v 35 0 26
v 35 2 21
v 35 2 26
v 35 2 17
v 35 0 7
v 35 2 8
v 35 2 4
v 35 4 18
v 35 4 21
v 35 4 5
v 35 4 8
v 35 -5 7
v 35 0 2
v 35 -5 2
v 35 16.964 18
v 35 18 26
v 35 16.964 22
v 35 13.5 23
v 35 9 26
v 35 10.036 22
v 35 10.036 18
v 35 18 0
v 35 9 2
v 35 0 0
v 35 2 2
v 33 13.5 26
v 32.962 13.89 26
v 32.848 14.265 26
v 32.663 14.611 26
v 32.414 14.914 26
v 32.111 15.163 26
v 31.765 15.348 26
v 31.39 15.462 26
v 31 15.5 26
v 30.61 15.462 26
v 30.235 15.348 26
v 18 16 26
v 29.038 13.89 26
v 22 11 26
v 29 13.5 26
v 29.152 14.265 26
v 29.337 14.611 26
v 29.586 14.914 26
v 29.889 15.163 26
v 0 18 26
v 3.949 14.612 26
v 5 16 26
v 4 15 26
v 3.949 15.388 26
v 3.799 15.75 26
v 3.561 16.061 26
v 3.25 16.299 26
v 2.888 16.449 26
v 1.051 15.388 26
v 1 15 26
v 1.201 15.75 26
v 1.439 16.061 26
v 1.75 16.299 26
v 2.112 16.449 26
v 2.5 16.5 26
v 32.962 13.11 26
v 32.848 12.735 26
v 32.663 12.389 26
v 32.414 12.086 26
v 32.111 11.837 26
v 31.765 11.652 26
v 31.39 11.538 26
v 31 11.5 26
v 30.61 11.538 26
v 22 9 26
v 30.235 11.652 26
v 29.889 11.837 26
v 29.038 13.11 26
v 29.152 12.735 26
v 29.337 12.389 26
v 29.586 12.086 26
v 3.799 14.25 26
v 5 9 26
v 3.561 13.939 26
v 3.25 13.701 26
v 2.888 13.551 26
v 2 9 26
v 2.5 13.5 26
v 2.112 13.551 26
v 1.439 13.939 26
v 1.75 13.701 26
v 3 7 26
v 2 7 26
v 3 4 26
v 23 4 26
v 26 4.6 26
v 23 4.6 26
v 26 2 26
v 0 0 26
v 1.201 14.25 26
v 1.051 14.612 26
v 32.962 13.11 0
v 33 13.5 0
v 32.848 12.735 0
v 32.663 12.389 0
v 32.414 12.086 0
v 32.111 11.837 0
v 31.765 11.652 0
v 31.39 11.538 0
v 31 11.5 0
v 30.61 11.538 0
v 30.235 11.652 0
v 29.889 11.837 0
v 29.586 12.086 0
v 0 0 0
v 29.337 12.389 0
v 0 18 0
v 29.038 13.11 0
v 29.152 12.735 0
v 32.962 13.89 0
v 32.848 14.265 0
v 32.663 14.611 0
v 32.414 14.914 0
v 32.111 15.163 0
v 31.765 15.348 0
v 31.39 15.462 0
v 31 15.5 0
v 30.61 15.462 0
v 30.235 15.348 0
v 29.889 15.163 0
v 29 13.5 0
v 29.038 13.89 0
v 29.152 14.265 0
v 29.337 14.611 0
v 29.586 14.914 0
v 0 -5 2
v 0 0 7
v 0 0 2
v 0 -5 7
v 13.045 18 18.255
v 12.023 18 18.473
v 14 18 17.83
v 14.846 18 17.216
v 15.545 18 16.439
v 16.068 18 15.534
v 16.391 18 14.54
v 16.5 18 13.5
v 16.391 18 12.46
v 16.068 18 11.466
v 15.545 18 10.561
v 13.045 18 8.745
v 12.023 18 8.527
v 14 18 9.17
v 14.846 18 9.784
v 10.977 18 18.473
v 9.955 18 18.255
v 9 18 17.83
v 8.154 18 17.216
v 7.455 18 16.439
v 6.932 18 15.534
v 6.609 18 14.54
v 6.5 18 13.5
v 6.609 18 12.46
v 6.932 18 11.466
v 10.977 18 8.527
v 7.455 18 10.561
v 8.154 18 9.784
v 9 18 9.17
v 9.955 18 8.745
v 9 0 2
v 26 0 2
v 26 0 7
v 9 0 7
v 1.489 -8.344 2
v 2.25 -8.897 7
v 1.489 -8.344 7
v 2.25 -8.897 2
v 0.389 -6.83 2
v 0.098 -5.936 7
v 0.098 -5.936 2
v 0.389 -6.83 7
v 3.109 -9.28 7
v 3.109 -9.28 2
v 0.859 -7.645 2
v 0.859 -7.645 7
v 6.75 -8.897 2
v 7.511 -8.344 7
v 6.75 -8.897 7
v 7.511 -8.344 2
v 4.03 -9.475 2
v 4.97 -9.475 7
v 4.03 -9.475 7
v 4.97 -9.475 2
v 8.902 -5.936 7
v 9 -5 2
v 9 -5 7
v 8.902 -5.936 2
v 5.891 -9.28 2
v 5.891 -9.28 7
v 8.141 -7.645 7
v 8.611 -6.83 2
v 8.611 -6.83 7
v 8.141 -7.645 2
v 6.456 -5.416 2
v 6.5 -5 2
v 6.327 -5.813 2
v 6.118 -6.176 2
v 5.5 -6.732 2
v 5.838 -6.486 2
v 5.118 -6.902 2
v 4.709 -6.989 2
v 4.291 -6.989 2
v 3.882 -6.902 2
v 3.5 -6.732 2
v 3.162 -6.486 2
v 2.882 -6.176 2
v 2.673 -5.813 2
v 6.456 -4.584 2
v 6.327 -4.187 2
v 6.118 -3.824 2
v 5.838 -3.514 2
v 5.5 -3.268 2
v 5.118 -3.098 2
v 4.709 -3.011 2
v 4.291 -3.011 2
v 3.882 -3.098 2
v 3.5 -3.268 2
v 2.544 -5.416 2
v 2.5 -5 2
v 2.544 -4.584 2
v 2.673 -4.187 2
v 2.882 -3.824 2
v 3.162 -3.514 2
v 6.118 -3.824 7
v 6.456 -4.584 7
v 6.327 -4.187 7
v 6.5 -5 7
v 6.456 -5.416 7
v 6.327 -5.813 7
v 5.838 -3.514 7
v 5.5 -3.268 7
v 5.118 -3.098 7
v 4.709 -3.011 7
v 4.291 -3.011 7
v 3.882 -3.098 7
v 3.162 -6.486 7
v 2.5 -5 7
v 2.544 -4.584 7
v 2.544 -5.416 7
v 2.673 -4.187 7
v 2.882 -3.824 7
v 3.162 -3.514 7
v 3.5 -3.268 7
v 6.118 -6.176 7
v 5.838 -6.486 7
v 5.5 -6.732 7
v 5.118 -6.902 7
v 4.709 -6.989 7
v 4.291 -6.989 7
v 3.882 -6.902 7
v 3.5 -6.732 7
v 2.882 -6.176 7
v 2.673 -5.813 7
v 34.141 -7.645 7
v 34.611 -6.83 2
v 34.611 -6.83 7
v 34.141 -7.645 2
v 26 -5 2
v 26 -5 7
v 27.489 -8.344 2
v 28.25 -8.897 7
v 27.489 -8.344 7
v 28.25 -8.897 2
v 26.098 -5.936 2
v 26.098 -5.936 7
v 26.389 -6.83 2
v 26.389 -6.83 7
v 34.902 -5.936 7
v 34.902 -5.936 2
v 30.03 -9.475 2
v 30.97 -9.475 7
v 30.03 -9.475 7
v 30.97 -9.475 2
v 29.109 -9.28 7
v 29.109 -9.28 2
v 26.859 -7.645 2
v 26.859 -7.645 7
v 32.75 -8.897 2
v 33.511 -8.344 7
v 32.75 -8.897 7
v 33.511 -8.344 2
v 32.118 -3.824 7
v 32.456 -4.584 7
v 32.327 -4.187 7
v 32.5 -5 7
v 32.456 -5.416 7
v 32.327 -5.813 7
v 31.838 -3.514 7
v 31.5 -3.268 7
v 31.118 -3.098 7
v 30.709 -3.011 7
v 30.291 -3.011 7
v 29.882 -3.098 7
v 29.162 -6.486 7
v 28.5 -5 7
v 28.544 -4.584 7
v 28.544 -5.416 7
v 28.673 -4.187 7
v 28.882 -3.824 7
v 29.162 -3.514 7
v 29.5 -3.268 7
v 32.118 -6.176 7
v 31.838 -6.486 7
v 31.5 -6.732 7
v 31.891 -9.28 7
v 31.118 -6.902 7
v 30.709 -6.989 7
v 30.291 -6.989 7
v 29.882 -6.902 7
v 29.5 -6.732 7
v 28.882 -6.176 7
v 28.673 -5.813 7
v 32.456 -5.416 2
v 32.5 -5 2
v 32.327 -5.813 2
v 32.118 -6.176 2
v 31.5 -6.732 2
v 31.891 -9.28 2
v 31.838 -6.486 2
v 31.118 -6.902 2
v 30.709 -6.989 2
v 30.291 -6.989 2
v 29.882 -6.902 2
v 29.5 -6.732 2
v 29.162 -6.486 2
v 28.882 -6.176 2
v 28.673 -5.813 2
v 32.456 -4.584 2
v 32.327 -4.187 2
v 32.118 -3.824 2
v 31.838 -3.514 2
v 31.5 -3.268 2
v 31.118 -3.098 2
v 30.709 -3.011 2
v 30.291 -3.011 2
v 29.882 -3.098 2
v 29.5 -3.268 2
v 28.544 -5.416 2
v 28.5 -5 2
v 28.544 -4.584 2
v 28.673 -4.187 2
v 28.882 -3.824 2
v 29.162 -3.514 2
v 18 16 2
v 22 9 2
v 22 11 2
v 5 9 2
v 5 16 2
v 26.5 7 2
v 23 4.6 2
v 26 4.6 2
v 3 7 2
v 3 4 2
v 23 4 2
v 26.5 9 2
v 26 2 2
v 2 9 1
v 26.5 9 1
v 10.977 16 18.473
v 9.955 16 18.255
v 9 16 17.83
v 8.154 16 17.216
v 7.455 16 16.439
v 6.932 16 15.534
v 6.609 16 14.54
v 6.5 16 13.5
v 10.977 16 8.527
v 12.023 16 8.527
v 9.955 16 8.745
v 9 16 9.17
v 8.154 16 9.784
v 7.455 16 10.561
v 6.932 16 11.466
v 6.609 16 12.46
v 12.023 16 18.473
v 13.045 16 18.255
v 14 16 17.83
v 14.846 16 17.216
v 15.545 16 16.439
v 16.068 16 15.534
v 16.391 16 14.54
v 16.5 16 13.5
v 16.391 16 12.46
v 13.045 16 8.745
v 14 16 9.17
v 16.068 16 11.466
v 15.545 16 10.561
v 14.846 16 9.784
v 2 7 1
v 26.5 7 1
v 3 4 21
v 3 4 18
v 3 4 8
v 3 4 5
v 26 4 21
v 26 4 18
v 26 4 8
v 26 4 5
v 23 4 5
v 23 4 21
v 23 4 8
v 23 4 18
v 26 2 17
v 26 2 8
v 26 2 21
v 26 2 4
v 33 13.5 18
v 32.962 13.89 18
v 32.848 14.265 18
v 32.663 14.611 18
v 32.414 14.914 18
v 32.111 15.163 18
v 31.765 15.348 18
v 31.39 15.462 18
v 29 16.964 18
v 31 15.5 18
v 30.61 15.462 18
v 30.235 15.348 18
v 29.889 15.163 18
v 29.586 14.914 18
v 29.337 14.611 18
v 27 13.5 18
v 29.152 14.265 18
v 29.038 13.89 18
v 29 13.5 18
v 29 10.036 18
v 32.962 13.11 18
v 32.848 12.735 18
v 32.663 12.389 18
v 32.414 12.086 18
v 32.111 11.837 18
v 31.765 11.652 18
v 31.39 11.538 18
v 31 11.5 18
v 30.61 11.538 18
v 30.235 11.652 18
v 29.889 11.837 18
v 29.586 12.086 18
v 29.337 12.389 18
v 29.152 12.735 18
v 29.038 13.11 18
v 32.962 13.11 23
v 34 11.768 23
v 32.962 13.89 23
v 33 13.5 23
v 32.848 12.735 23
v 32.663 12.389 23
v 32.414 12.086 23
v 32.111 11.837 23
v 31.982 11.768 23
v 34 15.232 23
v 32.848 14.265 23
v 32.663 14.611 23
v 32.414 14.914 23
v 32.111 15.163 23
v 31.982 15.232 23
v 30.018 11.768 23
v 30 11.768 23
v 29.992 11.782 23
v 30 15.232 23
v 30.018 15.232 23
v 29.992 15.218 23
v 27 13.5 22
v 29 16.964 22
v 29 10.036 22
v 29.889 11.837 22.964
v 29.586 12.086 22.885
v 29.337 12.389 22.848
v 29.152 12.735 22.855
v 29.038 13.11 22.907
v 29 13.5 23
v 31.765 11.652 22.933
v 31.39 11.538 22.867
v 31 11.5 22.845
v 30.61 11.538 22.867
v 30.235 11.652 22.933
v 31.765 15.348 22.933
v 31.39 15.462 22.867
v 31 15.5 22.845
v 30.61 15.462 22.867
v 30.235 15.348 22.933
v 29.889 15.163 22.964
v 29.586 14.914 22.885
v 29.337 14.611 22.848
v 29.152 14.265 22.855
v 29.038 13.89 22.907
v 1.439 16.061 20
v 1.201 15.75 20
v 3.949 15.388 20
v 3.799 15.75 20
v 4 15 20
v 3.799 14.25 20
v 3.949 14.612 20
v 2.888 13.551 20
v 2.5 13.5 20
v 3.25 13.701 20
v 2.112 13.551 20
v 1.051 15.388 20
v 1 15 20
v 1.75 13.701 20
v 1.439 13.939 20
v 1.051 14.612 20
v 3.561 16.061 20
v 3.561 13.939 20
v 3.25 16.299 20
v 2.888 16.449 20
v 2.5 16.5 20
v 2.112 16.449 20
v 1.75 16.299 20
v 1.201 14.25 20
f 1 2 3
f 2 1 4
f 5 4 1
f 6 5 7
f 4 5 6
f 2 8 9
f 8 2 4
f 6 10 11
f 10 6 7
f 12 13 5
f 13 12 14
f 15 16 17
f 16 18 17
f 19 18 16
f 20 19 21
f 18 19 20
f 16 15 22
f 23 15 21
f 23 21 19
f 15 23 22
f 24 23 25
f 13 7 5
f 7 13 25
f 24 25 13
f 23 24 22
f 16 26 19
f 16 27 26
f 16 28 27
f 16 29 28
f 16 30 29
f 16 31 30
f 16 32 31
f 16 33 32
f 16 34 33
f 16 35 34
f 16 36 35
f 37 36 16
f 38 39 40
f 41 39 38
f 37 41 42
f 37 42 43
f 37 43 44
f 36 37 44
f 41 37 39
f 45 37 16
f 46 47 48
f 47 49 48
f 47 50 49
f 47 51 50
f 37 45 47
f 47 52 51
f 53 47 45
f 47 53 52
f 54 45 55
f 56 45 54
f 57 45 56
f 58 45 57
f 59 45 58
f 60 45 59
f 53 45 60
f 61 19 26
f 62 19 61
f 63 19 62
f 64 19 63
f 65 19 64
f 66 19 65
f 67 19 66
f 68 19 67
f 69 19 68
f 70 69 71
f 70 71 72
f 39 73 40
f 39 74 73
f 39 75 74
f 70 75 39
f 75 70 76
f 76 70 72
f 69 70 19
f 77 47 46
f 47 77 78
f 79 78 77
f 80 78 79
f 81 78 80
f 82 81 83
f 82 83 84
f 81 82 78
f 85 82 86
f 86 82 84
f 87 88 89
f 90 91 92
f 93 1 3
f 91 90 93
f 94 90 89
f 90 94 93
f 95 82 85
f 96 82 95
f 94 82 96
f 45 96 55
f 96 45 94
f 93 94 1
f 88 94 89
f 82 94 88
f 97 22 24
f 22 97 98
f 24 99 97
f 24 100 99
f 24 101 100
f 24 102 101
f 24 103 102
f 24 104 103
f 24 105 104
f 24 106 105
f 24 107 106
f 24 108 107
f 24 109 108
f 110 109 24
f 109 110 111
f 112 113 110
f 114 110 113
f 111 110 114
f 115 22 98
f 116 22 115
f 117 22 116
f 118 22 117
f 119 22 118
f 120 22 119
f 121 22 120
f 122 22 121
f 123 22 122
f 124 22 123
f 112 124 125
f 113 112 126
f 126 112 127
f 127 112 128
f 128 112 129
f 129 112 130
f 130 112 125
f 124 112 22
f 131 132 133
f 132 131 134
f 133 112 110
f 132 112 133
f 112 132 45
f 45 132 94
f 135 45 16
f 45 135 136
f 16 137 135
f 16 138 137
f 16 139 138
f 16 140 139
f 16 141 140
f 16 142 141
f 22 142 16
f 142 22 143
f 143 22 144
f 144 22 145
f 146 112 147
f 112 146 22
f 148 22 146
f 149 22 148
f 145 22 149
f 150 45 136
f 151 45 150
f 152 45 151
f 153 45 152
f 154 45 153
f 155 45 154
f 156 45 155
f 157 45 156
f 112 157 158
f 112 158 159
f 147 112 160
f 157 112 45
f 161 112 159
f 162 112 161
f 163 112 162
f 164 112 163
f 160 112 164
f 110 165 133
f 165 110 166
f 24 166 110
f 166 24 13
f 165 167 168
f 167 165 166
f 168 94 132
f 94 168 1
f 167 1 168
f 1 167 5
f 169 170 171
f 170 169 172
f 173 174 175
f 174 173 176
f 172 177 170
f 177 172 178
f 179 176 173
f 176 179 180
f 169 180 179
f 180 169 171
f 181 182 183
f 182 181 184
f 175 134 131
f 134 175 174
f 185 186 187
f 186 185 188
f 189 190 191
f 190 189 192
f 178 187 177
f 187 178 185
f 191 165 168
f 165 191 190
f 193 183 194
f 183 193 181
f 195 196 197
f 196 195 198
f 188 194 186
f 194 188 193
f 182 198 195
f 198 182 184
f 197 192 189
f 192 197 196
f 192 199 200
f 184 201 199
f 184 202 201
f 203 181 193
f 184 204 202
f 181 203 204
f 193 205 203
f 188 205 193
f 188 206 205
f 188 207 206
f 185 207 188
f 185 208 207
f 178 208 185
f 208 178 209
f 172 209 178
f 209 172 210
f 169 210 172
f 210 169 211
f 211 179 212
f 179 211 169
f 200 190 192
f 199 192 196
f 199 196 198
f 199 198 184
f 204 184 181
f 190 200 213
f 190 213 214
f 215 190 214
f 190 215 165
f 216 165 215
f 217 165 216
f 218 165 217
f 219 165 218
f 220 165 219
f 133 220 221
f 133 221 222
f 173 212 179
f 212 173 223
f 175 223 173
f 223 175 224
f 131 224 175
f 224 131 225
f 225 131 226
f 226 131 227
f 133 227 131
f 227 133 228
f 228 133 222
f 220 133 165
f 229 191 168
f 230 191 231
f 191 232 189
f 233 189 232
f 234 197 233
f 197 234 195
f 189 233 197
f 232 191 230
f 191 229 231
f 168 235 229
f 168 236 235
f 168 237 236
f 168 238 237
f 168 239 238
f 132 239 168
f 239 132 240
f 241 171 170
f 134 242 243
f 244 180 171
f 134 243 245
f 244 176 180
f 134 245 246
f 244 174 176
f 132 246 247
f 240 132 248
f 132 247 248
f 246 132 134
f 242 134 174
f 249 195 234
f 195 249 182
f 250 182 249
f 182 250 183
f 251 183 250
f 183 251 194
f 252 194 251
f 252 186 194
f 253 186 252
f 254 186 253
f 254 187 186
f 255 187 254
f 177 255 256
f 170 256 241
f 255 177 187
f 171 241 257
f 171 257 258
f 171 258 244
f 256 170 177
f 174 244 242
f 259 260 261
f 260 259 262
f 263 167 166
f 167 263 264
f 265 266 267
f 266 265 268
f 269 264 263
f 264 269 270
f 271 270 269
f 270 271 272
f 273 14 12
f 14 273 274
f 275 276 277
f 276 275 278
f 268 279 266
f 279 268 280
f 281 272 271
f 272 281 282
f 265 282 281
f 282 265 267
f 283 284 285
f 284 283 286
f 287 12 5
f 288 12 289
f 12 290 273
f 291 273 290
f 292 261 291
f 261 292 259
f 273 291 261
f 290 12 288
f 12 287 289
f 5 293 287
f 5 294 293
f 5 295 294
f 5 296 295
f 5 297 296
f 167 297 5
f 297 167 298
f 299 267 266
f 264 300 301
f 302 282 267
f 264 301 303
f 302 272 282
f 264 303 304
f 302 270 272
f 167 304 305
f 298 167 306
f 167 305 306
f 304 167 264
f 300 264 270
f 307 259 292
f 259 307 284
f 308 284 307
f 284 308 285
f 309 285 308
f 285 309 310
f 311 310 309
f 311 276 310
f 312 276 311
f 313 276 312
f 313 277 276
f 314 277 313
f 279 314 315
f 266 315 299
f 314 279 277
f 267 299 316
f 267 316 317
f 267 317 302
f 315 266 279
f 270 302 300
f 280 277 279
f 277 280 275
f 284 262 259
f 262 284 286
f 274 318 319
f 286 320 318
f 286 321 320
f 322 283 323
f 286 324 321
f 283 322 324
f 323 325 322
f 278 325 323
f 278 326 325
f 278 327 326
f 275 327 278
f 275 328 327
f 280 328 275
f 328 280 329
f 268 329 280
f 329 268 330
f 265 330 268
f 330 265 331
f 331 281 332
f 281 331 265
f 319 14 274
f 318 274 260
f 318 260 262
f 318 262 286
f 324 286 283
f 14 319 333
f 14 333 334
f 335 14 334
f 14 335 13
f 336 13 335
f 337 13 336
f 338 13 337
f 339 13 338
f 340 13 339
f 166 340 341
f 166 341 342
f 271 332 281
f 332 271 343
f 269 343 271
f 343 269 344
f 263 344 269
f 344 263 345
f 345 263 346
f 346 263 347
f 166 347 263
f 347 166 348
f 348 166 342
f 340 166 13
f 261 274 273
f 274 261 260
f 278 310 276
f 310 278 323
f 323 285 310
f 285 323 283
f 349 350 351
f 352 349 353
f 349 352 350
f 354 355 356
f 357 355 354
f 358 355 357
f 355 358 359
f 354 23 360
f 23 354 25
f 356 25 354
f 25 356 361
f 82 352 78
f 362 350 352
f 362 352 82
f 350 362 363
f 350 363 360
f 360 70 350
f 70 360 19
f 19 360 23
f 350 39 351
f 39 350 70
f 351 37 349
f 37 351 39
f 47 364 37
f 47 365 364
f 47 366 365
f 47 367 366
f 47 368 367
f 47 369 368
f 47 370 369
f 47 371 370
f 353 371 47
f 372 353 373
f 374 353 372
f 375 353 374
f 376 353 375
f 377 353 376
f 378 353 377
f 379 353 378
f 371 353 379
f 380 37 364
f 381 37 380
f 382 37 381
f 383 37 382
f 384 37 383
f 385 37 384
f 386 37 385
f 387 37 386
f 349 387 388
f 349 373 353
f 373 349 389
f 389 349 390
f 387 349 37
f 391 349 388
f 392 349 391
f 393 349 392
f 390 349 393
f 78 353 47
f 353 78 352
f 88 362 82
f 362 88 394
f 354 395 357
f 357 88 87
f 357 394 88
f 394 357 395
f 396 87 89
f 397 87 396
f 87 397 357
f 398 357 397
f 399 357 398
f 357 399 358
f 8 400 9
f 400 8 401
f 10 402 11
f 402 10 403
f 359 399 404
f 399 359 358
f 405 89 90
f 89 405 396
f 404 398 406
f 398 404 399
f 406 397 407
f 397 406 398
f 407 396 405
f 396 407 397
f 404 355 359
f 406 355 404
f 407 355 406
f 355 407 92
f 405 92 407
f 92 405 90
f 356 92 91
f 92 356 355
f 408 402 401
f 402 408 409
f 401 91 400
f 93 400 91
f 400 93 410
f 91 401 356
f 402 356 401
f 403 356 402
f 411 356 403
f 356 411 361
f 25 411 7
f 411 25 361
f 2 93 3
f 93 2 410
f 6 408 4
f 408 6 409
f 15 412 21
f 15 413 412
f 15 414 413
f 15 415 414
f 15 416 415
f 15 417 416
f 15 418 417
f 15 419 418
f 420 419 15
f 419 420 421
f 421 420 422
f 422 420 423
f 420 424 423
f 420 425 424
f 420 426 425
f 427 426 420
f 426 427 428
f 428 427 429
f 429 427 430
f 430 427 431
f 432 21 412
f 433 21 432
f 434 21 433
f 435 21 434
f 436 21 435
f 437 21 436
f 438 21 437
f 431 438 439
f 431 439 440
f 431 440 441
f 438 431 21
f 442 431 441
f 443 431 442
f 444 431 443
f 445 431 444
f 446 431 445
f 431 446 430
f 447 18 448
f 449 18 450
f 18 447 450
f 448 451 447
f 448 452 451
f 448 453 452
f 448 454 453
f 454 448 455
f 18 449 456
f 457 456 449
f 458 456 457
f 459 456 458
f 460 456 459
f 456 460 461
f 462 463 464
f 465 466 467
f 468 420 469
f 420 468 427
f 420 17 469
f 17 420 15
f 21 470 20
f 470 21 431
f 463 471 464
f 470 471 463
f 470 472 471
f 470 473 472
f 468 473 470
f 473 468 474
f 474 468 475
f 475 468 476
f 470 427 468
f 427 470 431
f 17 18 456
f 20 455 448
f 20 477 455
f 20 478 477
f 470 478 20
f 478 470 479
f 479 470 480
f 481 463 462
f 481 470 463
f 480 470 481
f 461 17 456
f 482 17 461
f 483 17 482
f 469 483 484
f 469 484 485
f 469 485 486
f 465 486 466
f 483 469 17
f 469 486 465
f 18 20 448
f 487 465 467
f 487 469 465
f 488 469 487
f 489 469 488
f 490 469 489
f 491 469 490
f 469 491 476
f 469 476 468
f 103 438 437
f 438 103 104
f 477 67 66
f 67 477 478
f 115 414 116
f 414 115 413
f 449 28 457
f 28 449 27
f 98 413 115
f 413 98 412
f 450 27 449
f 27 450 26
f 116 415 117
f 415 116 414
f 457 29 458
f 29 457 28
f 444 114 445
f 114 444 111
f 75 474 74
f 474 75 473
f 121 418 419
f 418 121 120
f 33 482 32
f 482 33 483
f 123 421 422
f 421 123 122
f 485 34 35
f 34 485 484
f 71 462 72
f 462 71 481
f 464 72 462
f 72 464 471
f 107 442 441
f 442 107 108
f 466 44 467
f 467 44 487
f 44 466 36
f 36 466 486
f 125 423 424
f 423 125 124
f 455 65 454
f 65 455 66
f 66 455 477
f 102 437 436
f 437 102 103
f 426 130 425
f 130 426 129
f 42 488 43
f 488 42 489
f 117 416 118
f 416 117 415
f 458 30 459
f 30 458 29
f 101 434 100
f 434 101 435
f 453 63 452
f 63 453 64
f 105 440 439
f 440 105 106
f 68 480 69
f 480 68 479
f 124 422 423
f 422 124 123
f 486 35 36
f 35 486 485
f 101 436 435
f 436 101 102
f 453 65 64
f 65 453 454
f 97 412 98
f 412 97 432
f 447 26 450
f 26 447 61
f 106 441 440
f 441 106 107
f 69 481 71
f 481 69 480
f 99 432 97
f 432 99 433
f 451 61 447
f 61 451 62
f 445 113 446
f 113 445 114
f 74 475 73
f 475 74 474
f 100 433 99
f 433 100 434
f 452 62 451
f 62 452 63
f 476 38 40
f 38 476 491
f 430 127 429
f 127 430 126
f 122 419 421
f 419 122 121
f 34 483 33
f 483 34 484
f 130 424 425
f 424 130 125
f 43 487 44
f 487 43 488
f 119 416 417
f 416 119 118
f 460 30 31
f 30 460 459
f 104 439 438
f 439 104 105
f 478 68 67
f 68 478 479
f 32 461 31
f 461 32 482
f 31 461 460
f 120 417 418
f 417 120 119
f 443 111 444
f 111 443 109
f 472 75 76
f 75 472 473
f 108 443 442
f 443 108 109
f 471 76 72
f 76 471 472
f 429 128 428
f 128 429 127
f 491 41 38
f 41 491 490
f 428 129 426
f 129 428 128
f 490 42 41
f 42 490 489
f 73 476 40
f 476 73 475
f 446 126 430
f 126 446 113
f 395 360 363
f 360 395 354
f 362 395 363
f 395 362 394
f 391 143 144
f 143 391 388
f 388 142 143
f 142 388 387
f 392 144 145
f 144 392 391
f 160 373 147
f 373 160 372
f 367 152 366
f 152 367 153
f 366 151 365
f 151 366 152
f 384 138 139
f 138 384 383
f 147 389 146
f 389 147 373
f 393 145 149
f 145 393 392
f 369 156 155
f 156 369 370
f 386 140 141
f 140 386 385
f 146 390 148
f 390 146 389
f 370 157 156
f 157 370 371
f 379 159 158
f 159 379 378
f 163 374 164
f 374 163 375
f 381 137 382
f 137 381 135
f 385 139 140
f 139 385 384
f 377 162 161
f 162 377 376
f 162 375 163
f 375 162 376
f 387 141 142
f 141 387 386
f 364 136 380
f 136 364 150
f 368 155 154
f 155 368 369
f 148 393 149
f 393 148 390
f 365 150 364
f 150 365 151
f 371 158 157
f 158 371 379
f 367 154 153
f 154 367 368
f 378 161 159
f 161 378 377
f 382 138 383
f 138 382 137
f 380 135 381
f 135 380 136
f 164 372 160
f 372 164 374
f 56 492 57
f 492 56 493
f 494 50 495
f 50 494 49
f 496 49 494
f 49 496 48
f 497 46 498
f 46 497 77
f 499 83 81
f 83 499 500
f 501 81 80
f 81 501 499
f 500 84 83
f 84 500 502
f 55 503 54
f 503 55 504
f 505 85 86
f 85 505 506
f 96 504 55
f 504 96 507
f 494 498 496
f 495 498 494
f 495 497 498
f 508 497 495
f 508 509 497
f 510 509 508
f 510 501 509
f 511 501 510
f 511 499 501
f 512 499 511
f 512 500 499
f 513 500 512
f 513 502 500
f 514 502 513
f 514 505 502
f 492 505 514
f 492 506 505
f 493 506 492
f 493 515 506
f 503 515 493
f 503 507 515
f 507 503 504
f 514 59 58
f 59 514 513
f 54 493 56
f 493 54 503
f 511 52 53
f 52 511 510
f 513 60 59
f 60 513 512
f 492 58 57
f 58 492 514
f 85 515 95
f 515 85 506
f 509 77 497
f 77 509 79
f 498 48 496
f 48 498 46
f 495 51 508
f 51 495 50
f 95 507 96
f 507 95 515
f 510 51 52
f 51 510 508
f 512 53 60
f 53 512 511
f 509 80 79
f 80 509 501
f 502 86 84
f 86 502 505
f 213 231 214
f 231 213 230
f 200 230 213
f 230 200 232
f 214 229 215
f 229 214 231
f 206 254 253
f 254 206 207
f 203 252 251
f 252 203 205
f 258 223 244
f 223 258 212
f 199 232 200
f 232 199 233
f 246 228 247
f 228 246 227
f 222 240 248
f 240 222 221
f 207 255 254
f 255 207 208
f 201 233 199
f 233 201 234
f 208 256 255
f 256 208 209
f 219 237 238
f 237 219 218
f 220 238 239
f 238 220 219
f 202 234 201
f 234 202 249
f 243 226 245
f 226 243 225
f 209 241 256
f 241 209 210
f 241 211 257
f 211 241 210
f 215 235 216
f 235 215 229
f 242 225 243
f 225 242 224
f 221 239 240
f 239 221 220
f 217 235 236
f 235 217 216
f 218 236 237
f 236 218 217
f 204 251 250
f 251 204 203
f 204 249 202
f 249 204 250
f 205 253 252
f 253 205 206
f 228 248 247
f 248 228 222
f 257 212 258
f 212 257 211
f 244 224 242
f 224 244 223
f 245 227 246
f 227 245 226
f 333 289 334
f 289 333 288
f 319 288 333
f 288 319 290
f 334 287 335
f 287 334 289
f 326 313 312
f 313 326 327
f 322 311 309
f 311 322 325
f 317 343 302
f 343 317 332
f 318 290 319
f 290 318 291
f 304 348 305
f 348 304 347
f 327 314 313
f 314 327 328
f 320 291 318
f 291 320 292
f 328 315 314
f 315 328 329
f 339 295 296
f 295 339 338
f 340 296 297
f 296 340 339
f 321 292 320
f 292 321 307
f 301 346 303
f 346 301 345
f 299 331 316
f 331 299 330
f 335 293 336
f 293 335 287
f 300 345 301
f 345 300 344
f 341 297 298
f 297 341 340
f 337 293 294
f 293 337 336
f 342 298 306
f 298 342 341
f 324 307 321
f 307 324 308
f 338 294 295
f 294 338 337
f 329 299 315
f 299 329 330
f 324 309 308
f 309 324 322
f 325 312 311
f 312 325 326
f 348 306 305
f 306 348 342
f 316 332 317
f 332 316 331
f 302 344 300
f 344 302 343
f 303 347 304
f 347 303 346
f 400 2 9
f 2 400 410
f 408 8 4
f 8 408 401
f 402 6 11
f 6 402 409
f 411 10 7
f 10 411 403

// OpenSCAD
$fs = 0.4;

p = [[3, 3], [3, 6], [2, 6], [2, 8], [5, 8], [5, 15], [18.0, 15], [22.0, 10], [22.0, 8], [56.2, 8], [56.2, 1], [26, 1], [26, 3.6], [23, 3.6], [23, 3]];

difference() {
    union() {
        cube([35,18,26]);
        
        translate([4.5,0,2])
        hull() {
            translate([0,-5,0])
            cylinder(d=9, h=5);
            cylinder(d=9,h=5);
        }
        
        translate([30.5,0,2])
        hull() {
            translate([0,-5,0])
            cylinder(d=9, h=5);
            cylinder(d=9,h=5);
        }
    }
    
    translate([0,1,2])
    linear_extrude(30)
    polygon(p);    
    
    hull() {
        translate([31,13.5,18])
        cylinder(d=8, h=4, $fa=60);
        
        translate([31,13.5,19])
        cylinder(d=4, h=4, $fa=60);
        
        translate([33,13.5,18], $fa=60)
        cylinder(d=8, h=4, $fa=60);
        
        translate([33,13.5,19])
        cylinder(d=4, h=4, $fa=60);
    }
    
    translate([31,13.5,-1])
    cylinder(d=4, h=40, $fa=10);
    
    translate([2,7,1])
    cube([24.5,2,10]);
    
    translate([11.5,10,25/2+1])
    rotate([-90,0,0])
    cylinder(d=10,h=10);
    
    translate([2.5,15,20])
    cylinder(d=3, h=10);
    
    translate([4.5,-5,0])
    cylinder(d=4,h=20);
    
    translate([30.5,-5,0])
    cylinder(d=4,h=20);
}

translate([0,0,21])
rotate([0,90,0])
linear_extrude(35)
polygon([[0,0],[0,4],[3,4],[5,0]]);


translate([0,0,8])
rotate([0,90,0])
linear_extrude(35)
polygon([[0,0],[0,4],[3,4],[5,0]]);
